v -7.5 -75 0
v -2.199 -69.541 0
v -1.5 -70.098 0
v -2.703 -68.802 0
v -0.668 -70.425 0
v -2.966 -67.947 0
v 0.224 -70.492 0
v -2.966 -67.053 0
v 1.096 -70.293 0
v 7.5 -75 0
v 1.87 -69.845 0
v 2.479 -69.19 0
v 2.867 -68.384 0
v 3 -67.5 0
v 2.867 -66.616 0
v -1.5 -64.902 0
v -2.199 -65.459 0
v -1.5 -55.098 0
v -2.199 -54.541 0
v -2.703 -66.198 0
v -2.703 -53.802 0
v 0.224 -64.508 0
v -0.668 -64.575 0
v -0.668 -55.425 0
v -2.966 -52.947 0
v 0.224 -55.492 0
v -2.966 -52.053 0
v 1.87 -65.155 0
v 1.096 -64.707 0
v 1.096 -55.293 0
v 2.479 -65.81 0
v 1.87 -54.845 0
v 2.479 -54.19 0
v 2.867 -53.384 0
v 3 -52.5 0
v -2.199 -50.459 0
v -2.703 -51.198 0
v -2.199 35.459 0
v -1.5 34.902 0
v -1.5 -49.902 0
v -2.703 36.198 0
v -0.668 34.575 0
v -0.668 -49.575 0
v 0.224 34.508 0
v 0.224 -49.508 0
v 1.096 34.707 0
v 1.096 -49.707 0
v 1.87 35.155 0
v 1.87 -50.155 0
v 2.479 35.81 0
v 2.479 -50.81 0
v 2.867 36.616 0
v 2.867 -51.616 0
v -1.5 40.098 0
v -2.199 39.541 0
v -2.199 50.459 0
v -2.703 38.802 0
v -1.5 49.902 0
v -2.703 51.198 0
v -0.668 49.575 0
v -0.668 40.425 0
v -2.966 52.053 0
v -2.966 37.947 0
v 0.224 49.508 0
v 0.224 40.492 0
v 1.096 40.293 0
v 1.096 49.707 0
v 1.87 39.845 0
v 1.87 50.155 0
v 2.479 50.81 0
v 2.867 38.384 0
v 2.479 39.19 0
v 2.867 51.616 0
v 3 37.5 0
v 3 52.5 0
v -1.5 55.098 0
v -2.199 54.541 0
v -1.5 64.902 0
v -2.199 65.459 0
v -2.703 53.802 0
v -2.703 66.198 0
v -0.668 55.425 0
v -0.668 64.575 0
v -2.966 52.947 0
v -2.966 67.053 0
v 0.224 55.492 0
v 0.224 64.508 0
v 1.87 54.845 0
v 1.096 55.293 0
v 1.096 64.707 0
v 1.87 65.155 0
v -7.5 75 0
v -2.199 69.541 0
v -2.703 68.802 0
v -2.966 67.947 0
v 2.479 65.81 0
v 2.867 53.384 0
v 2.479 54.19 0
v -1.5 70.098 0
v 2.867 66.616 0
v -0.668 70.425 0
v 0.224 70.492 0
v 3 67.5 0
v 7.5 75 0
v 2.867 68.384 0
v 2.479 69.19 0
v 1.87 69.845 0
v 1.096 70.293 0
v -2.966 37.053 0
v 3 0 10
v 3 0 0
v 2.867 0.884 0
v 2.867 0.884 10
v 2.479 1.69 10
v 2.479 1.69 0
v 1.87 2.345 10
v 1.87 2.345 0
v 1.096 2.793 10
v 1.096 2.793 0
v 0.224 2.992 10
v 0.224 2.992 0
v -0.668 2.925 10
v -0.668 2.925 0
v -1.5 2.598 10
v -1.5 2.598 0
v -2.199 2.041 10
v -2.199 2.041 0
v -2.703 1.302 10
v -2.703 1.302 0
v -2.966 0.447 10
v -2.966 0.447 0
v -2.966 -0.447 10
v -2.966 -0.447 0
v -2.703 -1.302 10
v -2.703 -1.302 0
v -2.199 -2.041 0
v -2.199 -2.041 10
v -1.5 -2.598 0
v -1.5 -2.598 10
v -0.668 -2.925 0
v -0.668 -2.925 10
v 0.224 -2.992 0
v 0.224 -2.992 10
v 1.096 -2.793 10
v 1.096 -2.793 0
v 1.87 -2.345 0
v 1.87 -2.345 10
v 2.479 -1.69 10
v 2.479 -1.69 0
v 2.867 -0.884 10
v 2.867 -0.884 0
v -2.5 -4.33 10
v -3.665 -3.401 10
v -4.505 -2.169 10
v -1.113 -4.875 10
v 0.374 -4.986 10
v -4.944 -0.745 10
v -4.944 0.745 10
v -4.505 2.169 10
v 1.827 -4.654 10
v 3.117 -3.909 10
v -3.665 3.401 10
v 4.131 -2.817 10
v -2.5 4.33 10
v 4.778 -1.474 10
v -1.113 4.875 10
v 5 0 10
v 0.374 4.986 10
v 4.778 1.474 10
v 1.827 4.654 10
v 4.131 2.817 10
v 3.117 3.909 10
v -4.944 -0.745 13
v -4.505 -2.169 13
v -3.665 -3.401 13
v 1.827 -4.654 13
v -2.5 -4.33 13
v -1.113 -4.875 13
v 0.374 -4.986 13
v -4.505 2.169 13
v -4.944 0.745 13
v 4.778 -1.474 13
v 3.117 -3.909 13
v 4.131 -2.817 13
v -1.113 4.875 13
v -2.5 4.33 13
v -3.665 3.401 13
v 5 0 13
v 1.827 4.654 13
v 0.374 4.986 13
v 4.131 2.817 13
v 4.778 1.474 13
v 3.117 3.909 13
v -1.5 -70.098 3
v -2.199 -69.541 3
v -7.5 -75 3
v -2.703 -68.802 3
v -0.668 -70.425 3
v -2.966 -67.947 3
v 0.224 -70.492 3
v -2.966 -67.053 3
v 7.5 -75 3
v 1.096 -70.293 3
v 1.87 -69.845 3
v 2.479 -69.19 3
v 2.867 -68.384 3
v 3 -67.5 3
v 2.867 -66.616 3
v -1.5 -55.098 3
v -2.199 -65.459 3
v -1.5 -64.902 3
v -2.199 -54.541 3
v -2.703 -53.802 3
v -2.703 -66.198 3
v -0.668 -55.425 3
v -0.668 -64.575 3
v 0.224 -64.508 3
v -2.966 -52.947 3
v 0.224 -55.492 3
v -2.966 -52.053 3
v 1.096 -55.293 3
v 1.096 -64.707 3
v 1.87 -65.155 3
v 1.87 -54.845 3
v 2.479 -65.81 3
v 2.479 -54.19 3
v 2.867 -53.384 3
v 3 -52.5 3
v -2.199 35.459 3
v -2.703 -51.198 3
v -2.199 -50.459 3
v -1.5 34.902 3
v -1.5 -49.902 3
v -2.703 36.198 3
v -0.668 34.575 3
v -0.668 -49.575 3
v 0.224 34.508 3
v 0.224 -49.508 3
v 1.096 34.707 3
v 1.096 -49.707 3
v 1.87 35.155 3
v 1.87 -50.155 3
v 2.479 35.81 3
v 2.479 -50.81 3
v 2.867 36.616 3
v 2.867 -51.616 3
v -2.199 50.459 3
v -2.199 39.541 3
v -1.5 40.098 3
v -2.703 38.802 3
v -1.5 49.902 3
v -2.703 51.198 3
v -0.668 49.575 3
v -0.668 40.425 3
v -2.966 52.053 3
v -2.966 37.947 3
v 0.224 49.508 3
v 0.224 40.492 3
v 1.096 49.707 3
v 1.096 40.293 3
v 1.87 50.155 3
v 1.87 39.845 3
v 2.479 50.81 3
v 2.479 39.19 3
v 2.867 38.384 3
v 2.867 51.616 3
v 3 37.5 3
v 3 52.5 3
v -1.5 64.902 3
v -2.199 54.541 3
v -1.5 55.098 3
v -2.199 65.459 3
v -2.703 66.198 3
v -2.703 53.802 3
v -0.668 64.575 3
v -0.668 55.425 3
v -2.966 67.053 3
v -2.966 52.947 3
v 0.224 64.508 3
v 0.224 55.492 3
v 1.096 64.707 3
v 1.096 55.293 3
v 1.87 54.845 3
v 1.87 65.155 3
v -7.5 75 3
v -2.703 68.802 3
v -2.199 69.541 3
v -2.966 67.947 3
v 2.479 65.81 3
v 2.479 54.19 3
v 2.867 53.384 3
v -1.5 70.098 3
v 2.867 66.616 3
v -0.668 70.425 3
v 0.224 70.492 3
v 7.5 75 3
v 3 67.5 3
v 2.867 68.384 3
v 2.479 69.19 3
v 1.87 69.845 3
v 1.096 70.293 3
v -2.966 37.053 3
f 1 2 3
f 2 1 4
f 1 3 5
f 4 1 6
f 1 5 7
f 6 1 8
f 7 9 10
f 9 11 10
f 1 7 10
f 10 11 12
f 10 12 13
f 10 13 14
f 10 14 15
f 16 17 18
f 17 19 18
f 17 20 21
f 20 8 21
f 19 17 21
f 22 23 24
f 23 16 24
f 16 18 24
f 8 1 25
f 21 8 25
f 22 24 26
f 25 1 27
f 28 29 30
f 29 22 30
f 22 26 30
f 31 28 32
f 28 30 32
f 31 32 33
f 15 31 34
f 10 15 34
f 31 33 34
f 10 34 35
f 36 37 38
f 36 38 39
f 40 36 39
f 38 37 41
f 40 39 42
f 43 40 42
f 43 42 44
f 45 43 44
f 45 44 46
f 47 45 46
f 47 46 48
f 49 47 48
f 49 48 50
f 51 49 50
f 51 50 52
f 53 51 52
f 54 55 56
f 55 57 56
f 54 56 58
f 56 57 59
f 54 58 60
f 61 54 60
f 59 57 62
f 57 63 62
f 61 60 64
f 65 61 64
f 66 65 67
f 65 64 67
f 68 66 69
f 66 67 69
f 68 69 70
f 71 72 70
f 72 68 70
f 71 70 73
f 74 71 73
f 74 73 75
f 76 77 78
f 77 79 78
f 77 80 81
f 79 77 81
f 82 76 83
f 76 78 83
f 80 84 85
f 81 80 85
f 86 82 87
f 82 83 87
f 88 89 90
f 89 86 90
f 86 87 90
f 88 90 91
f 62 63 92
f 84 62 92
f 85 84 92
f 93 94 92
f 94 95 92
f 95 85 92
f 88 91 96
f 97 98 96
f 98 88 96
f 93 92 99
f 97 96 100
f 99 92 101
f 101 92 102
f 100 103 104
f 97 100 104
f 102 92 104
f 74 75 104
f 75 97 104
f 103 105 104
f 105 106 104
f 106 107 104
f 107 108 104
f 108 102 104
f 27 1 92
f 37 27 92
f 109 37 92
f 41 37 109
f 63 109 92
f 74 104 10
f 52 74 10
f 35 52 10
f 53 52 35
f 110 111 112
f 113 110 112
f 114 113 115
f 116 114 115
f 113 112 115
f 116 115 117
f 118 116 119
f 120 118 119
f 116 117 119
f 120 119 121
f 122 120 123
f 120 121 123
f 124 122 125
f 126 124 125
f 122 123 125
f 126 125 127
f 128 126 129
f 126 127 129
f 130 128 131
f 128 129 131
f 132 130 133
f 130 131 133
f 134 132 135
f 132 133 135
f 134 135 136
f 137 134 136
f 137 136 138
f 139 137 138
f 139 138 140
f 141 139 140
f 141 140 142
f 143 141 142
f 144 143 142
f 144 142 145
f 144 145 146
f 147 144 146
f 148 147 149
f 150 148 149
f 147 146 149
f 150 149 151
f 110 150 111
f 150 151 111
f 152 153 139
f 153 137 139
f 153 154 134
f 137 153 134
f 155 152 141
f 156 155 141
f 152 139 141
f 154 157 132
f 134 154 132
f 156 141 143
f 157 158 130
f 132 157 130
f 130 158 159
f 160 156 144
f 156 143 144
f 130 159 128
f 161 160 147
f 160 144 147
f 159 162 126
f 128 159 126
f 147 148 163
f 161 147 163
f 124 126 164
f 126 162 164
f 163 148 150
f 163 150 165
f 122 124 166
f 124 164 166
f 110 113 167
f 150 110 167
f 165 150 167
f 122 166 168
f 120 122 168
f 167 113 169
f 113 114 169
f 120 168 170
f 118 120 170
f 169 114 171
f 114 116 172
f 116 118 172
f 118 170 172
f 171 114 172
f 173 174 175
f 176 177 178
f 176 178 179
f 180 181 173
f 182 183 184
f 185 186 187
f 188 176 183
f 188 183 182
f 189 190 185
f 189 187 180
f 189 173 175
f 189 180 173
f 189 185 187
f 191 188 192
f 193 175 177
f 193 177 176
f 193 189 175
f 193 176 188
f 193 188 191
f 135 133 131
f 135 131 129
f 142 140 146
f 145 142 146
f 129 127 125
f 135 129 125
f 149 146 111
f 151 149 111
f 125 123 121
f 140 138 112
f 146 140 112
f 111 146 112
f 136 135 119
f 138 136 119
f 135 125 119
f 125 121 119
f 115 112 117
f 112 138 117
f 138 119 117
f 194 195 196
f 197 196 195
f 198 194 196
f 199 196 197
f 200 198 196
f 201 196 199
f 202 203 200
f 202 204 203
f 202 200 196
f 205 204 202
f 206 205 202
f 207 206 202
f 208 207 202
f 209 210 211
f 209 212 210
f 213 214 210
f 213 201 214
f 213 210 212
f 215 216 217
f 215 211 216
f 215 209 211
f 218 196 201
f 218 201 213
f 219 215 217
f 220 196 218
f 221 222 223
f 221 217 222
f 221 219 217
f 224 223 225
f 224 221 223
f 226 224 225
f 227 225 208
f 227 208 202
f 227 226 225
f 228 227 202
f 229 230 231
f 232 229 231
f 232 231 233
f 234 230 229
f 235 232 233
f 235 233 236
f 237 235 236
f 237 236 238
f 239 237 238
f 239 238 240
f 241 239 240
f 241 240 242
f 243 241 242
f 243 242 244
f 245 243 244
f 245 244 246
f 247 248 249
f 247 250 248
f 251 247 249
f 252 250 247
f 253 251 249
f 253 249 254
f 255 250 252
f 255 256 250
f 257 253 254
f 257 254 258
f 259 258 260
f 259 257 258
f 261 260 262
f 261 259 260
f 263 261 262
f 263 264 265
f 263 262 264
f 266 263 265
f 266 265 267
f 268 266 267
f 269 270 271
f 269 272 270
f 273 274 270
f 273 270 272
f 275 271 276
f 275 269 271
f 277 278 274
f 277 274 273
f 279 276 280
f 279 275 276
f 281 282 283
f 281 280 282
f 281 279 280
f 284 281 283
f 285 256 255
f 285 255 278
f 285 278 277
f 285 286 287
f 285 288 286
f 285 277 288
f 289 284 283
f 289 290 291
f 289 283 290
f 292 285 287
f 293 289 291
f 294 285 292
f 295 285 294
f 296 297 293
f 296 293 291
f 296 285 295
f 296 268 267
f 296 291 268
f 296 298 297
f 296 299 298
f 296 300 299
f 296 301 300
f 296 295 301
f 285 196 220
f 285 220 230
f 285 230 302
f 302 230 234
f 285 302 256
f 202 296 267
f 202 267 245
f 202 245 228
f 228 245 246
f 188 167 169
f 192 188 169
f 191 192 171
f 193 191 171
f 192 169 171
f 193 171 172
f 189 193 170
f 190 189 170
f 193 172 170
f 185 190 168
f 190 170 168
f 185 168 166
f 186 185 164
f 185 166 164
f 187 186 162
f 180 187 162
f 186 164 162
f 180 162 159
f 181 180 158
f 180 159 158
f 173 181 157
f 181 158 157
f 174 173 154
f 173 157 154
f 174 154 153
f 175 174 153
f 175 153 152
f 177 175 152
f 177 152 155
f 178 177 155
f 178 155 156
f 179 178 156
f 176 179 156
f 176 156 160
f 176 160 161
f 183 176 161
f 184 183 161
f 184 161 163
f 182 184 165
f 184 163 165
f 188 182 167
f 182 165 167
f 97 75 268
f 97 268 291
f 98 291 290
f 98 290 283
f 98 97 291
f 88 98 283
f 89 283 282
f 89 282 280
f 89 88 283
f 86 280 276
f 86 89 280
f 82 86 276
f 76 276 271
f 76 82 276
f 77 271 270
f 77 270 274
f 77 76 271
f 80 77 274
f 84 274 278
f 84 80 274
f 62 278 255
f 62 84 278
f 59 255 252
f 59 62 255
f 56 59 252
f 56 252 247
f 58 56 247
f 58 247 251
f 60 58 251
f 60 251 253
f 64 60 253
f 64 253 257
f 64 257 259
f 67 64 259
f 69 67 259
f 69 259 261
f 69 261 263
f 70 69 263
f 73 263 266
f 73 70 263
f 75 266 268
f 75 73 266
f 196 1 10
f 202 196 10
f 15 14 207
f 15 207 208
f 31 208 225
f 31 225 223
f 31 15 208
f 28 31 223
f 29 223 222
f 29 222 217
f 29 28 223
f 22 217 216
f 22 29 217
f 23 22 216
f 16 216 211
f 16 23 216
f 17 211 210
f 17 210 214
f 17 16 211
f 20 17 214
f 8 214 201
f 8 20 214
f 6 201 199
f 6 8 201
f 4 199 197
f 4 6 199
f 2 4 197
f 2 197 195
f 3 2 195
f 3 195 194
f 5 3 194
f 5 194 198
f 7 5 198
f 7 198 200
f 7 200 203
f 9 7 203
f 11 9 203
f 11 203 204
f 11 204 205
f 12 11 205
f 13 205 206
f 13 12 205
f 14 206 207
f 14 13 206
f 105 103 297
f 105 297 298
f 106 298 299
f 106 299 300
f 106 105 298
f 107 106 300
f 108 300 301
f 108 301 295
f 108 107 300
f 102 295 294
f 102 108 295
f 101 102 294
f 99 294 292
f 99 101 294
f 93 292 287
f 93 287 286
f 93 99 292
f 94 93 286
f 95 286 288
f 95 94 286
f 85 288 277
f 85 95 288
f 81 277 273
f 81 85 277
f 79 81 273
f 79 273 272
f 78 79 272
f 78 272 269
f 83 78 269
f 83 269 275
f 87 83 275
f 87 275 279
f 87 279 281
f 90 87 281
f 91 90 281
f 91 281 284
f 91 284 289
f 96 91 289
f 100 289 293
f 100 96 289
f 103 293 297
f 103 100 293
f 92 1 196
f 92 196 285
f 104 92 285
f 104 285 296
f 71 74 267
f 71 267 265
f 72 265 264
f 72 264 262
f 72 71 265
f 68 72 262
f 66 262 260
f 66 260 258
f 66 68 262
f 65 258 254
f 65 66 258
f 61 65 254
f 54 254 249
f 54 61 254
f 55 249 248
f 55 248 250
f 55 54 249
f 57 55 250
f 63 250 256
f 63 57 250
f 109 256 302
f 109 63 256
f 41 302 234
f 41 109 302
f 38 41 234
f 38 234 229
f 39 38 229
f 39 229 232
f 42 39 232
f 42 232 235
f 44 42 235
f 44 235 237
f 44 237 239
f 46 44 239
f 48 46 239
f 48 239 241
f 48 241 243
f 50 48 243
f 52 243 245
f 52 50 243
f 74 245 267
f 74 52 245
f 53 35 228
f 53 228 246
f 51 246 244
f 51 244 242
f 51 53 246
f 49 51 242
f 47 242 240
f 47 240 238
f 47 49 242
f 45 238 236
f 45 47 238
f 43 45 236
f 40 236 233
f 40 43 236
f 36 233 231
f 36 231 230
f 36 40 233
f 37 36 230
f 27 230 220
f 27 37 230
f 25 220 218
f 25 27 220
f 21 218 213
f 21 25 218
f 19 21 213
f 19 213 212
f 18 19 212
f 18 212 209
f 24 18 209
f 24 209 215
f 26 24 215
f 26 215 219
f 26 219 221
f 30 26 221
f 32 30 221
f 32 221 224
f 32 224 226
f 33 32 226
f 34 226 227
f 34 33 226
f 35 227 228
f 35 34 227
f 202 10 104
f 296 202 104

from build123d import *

# Parameters (mm, degrees)
F0_W     = 15
F0_H     = 150
F0_R     = 3
F1_DEPTH = 3
F2_R     = 3
F3_DEPTH = 10
F4_R     = 5
F5_DEPTH = 3


with BuildPart() as f1:
    # F0 (on Top) → F1 (new body)
    with BuildSketch(Plane.XY):
        Rectangle(F0_W, F0_H)
        with Locations((0, -67.5)):
            Circle(F0_R, mode=Mode.SUBTRACT)
        with Locations((0, -52.5)):
            Circle(F0_R, mode=Mode.SUBTRACT)
        with Locations((0, 37.5)):
            Circle(F0_R, mode=Mode.SUBTRACT)
        with Locations((0, 52.5)):
            Circle(F0_R, mode=Mode.SUBTRACT)
        with Locations((0, 67.5)):
            Circle(F0_R, mode=Mode.SUBTRACT)
    extrude(amount=F1_DEPTH)


with BuildPart() as f3:
    # F2 (on Top) → F3 (new body)
    with BuildSketch(Plane.XY):
        Circle(F2_R)
    extrude(amount=F3_DEPTH)

    # F4 (on face) → F5 (join)
    with BuildSketch(Plane.XY.offset(10)):
        Circle(F4_R)
    extrude(amount=F5_DEPTH)


solid = Compound([f1.part, f3.part])
